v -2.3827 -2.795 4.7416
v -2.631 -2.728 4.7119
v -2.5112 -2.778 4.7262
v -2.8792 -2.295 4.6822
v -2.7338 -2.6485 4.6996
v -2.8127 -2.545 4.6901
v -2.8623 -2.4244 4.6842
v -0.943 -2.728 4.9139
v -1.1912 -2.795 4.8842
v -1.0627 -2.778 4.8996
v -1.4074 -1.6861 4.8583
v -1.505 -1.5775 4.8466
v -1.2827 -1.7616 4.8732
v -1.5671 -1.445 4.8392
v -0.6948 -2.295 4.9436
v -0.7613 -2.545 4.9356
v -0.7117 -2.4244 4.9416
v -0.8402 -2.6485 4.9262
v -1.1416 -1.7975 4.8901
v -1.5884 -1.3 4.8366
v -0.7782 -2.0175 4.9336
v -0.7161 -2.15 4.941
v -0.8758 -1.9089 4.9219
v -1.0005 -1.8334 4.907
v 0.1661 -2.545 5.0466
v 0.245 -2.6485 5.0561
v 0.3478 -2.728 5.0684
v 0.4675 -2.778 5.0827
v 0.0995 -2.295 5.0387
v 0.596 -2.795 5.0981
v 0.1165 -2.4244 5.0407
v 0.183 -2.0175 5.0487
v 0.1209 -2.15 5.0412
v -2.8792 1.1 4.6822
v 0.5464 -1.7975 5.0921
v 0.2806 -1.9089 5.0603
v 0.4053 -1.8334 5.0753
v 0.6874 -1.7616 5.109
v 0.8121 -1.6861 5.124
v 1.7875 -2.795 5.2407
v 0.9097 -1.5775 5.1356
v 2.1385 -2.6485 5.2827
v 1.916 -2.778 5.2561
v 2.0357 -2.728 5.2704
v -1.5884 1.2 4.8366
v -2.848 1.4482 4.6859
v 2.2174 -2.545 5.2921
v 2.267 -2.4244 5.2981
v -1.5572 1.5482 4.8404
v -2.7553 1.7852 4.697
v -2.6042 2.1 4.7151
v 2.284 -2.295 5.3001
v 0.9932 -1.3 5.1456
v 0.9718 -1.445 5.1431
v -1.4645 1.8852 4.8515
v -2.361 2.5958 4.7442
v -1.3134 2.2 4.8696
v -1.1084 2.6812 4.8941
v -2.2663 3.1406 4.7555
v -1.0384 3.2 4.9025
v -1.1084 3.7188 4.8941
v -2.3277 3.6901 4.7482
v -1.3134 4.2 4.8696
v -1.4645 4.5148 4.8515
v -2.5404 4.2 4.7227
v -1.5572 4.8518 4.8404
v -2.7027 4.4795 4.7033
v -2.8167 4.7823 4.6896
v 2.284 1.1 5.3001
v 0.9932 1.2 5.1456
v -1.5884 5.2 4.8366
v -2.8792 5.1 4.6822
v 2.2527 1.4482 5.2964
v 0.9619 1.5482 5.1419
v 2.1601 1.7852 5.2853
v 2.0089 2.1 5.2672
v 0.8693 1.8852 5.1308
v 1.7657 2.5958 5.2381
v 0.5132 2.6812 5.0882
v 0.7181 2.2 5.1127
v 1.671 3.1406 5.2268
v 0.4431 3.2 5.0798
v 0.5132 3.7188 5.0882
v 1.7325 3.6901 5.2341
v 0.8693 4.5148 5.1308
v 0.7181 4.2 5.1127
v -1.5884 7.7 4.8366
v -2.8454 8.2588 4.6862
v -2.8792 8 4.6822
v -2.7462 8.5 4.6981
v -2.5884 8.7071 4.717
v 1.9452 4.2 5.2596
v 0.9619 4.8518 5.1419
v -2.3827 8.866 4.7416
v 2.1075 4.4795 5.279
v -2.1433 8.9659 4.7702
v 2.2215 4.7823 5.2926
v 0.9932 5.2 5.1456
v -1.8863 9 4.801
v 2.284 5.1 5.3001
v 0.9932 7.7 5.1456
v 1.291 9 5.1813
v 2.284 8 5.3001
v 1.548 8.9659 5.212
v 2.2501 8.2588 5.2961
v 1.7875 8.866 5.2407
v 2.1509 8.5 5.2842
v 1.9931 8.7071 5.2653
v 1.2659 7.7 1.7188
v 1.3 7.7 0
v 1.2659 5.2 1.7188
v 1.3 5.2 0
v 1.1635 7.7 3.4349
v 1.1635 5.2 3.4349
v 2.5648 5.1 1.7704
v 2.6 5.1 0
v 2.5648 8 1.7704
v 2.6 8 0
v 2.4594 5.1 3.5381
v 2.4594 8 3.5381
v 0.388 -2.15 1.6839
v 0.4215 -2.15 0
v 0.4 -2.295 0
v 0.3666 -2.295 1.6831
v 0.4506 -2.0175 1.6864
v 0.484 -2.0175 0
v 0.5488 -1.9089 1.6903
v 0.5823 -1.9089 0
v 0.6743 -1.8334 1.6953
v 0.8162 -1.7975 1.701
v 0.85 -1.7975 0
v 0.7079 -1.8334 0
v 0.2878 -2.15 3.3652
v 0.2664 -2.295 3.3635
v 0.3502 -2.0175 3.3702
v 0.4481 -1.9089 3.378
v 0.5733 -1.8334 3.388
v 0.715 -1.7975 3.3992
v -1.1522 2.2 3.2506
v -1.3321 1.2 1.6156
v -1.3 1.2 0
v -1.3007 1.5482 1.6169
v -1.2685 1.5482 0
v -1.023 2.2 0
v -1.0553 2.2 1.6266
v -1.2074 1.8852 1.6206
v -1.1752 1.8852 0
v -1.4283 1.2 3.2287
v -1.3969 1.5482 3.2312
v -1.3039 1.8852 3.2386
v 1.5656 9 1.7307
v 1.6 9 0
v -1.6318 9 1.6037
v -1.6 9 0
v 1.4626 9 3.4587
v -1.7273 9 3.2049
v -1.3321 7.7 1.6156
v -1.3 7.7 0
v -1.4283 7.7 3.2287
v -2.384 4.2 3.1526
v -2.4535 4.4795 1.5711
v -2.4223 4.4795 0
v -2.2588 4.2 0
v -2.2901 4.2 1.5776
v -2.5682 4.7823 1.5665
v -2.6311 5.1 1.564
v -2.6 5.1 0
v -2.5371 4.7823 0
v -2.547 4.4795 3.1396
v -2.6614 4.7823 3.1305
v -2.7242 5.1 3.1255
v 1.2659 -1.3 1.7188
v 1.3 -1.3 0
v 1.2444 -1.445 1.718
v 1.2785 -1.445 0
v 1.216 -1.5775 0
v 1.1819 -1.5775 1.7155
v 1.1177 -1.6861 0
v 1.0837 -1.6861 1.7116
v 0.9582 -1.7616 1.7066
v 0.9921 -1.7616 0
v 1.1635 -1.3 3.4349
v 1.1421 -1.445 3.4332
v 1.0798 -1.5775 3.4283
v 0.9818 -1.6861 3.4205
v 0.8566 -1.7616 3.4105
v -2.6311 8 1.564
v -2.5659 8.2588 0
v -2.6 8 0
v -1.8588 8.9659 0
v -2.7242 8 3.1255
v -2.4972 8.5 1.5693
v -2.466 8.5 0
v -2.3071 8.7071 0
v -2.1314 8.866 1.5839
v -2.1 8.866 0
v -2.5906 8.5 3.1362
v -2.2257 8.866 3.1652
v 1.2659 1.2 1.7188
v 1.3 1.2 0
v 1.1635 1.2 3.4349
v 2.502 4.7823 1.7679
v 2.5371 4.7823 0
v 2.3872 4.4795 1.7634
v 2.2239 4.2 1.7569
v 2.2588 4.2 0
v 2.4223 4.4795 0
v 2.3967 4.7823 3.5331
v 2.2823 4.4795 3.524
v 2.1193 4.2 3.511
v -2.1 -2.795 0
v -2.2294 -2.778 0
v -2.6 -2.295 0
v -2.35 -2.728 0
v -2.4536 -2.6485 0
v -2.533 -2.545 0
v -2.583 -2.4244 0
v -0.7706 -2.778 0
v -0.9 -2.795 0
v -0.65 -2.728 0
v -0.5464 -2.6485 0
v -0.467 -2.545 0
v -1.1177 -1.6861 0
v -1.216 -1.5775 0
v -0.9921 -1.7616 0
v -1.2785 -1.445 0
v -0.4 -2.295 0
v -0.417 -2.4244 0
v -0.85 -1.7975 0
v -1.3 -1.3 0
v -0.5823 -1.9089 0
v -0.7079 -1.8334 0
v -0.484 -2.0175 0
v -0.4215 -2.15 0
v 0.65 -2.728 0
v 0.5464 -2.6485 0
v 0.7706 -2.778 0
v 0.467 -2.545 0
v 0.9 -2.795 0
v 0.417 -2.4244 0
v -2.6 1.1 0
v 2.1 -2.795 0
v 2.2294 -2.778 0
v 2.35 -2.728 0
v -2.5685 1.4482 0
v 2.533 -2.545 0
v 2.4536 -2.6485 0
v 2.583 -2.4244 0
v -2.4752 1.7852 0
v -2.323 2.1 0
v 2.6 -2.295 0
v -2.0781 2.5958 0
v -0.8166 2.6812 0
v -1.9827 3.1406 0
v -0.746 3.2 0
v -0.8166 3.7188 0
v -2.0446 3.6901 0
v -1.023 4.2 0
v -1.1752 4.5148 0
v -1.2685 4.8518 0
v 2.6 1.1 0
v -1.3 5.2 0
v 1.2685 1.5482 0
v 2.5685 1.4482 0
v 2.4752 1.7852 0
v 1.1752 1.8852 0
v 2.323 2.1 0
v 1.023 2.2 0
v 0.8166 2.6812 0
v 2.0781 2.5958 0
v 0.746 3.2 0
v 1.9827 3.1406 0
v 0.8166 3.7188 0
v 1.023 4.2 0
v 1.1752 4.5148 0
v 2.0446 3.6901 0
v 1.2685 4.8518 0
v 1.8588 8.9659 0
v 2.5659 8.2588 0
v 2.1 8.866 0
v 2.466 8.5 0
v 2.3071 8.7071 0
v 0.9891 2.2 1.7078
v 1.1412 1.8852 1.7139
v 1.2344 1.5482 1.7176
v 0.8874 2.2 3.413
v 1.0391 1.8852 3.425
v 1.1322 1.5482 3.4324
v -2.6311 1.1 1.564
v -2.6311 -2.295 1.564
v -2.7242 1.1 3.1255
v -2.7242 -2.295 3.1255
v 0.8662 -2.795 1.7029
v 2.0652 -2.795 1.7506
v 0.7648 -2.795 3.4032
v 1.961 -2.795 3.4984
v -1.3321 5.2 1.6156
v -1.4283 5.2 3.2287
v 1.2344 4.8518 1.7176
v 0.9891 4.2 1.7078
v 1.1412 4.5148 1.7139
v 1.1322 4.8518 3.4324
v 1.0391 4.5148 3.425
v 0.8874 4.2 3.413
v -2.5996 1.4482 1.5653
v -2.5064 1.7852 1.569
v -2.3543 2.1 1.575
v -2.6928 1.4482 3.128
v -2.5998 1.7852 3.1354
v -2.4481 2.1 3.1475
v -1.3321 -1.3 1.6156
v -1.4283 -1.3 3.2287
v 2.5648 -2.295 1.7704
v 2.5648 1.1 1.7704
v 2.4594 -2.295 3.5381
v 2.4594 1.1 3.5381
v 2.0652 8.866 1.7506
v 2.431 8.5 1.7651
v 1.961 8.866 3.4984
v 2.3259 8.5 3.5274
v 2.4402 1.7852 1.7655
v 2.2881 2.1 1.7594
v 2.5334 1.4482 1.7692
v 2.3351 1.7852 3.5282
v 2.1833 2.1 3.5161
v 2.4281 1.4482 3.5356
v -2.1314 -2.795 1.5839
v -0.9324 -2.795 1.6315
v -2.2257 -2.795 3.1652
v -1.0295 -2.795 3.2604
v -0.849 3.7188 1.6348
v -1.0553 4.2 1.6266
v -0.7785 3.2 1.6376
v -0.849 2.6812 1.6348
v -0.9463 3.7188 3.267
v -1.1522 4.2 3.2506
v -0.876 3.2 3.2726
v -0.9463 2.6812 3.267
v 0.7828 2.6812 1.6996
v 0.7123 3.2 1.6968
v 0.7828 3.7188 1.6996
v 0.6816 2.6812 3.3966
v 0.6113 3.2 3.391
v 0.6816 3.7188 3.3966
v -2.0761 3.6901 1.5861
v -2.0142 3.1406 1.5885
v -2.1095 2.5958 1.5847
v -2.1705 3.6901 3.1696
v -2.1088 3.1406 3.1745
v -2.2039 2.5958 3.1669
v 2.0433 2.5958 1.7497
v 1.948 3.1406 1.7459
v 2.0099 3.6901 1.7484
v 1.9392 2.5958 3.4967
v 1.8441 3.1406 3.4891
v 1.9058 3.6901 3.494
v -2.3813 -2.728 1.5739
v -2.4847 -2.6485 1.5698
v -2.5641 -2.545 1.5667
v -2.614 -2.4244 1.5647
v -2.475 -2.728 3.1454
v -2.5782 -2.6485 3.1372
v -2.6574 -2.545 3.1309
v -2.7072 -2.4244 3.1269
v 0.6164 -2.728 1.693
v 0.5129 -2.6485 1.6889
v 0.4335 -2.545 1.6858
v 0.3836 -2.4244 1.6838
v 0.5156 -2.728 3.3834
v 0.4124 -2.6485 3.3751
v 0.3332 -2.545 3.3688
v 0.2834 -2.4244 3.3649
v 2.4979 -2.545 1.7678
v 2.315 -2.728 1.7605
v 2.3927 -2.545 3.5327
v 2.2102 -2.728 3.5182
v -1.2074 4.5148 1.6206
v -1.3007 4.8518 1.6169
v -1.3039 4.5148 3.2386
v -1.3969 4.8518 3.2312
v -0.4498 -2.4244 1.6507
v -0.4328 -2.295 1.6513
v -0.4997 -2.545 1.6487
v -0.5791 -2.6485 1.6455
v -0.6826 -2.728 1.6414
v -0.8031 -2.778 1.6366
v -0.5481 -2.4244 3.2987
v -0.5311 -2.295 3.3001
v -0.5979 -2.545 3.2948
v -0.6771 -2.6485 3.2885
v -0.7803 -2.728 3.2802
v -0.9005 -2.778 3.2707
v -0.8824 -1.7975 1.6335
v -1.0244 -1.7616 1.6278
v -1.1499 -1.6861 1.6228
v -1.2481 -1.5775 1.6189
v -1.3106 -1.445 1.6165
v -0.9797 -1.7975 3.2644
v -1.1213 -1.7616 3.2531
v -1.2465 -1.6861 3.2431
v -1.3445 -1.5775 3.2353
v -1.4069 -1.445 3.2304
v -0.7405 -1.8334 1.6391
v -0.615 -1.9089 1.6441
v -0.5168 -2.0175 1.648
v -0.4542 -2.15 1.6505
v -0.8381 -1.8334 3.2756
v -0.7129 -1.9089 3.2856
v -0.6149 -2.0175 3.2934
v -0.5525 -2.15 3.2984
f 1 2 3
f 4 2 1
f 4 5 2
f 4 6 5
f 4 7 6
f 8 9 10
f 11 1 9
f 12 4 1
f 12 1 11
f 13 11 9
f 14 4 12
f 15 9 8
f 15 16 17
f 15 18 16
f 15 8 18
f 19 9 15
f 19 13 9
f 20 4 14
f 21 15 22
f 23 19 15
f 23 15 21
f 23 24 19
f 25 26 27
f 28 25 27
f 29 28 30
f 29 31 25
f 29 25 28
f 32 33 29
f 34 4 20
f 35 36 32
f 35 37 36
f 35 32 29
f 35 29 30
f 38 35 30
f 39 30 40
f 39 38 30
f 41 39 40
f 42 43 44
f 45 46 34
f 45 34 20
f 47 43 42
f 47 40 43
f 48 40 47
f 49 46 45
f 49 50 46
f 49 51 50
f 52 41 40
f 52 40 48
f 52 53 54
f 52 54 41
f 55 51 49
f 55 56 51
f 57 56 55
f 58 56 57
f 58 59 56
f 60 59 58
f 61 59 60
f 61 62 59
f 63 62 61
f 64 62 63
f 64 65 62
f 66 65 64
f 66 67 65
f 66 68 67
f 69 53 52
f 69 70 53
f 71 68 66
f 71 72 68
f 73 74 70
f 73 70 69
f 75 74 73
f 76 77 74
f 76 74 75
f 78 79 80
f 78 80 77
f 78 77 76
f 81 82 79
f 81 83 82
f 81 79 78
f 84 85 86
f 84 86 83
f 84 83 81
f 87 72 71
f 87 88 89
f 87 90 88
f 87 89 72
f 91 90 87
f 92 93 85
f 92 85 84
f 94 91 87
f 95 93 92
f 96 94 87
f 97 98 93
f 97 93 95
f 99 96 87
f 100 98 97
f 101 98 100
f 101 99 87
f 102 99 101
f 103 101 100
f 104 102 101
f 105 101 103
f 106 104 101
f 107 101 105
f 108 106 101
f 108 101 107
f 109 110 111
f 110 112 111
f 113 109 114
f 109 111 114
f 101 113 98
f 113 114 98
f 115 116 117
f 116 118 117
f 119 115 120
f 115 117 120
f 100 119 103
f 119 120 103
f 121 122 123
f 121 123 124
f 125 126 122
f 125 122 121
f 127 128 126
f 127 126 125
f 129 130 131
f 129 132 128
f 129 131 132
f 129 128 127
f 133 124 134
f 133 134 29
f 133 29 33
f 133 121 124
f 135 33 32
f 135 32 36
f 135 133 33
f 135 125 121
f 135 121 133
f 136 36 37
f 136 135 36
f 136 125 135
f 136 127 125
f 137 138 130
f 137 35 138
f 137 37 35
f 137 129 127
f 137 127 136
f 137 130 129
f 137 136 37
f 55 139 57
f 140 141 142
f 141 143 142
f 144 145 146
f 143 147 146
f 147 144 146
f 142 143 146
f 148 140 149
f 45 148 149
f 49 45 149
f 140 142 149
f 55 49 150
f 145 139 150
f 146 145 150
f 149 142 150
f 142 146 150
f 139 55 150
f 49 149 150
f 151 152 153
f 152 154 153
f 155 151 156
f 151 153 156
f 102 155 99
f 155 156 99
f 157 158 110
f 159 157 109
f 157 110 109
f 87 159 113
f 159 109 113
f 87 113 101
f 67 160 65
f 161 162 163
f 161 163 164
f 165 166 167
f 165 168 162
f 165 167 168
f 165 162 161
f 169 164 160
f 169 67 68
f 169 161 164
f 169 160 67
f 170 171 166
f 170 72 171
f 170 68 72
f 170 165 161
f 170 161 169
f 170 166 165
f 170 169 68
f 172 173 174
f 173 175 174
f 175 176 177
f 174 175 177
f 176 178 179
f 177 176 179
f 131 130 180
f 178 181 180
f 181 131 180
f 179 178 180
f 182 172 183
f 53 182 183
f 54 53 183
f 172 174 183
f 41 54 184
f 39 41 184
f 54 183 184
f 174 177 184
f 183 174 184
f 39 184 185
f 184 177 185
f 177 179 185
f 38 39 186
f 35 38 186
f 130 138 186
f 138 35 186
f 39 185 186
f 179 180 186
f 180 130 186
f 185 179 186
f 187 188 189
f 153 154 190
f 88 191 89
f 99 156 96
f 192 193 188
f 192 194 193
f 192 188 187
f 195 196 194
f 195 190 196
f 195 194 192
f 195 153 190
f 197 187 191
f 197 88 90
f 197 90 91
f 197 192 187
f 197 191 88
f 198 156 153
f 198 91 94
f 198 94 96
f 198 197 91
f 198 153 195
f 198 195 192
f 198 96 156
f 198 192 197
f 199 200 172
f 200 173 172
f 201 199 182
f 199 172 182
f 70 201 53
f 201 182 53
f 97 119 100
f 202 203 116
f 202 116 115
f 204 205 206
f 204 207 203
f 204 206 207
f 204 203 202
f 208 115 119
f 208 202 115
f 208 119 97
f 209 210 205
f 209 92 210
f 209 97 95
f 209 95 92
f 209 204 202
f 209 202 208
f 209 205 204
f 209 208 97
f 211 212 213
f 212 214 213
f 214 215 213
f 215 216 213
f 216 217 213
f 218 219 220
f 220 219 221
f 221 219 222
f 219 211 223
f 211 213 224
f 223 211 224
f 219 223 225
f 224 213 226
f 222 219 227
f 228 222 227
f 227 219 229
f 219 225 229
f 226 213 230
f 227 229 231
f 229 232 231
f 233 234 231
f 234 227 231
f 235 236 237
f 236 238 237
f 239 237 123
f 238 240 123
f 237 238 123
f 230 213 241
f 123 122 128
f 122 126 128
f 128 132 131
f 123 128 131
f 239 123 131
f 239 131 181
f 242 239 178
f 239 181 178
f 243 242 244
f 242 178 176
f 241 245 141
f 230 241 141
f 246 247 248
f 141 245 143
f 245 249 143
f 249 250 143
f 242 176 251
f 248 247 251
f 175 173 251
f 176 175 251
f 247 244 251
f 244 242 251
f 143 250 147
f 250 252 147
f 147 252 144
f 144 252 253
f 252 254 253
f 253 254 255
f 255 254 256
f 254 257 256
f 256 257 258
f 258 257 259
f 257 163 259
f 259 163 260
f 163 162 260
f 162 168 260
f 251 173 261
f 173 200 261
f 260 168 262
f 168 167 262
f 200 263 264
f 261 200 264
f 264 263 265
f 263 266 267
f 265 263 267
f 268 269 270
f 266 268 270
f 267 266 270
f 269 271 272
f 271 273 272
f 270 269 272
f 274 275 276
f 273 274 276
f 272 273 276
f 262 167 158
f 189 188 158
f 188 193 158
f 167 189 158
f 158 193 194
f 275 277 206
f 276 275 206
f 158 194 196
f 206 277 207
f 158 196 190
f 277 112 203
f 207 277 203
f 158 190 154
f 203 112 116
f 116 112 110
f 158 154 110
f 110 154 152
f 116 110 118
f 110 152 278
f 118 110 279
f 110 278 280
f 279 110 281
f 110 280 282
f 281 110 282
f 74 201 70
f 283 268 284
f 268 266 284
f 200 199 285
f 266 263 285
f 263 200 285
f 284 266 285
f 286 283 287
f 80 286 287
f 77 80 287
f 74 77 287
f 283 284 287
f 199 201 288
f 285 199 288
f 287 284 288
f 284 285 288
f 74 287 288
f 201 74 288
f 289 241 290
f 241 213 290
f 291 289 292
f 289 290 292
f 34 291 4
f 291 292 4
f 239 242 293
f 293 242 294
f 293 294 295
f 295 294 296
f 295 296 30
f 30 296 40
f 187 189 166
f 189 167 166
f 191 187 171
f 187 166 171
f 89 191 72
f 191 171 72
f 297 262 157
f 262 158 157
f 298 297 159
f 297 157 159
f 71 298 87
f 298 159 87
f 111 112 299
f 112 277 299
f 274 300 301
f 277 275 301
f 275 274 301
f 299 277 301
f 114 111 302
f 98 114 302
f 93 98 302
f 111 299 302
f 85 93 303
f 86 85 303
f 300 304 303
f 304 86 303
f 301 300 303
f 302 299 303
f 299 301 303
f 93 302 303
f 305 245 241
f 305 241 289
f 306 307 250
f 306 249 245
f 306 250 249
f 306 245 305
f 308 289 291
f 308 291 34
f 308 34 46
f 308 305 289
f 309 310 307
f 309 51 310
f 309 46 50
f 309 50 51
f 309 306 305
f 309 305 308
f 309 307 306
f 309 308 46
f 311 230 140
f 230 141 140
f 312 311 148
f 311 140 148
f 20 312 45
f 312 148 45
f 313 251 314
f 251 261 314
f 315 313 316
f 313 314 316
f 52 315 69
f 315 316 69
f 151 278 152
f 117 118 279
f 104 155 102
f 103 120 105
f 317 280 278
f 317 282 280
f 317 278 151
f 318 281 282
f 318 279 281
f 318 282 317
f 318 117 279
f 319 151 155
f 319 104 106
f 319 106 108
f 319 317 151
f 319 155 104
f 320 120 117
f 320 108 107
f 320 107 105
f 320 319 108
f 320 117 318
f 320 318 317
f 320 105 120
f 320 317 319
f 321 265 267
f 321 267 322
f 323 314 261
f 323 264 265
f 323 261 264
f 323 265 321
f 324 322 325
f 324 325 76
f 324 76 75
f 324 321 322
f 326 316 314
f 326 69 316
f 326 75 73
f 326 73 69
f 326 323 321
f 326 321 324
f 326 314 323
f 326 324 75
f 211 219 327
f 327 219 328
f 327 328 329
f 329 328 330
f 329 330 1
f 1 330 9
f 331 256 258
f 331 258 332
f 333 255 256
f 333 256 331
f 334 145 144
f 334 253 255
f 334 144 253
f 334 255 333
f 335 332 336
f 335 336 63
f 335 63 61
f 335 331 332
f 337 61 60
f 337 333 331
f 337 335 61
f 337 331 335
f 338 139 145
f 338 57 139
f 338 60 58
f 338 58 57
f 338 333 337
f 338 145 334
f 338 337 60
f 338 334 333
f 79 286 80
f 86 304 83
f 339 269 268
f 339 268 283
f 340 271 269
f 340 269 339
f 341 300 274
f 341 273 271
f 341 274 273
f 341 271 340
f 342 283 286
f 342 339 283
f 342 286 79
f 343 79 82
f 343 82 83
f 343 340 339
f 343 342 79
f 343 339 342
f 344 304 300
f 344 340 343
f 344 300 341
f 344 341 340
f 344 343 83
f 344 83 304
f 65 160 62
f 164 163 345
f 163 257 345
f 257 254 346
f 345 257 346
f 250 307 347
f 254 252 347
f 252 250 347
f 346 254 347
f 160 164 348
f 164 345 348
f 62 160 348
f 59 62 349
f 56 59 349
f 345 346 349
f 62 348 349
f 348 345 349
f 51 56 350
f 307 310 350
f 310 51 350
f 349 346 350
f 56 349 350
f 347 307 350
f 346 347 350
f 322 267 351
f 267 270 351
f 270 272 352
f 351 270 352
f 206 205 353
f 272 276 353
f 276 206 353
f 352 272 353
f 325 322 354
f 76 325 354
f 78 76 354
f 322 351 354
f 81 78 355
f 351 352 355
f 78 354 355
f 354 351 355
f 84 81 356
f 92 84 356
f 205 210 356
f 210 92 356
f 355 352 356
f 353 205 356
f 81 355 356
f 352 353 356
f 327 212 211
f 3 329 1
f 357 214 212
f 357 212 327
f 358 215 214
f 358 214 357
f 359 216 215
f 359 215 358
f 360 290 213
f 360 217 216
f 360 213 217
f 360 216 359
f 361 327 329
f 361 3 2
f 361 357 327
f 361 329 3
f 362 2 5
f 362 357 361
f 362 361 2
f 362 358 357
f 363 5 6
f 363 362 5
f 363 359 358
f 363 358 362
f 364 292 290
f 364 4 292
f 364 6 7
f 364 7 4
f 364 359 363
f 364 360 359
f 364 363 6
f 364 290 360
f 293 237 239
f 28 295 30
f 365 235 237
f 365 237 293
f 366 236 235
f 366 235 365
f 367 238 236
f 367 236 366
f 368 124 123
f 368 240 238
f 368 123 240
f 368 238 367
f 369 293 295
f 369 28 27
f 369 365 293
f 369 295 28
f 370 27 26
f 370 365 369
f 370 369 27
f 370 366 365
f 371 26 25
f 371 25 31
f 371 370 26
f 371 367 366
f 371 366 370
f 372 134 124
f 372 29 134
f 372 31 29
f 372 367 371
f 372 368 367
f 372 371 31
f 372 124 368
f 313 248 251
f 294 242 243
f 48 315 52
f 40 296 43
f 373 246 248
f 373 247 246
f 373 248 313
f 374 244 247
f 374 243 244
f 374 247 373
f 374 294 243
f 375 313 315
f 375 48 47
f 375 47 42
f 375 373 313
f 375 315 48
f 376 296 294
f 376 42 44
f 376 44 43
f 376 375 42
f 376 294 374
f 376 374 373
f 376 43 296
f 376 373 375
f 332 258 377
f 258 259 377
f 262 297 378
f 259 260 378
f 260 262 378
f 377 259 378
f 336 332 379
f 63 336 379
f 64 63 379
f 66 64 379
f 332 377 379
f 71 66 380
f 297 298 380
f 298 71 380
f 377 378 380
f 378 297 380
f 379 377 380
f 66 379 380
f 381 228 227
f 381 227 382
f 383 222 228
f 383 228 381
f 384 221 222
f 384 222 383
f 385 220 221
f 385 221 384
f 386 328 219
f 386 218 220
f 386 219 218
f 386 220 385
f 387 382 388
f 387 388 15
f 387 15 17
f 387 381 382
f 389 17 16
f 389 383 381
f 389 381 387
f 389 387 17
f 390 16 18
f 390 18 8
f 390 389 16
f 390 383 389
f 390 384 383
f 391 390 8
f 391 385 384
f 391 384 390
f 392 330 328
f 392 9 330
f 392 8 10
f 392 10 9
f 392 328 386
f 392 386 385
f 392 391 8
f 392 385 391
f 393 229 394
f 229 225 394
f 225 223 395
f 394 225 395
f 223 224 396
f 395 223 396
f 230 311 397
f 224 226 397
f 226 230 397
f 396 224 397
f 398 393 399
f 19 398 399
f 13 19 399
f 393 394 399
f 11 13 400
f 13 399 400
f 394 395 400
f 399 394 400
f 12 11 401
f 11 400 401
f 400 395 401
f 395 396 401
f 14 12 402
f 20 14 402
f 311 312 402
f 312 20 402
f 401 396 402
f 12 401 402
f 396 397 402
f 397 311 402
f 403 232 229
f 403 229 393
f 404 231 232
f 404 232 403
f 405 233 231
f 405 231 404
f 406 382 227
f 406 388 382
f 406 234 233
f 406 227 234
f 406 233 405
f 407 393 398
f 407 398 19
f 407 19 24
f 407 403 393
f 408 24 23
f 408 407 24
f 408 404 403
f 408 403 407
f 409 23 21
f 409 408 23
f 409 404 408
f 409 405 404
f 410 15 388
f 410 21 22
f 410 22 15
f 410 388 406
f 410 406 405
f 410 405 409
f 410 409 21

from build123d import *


with BuildPart() as part:
    # Sweep2: sweep along a path in Sketch12
    with BuildLine(Plane(origin=(0, 0, 0), x_dir=(1, 0, 0), z_dir=(0, 1, 0))) as sweep2_path:
        ThreePointArc((0, 0), (-0.074470784, -2.5), (-0.297619048, -4.99113443))
    # Sketch2 → Sweep2 (sweep)
    with BuildSketch(Plane.XY):
        with BuildLine():
            Line((-1.3, 7.7), (1.3, 7.7))
            Line((1.3, 7.7), (1.3, 5.2))
            ThreePointArc((1.3, 5.2), (1.229474497, 4.681174375), (1.023016035, 4.2))
            ThreePointArc((1.023016035, 4.2), (0.74603207, 3.2), (1.023016035, 2.2))
            ThreePointArc((1.023016035, 2.2), (1.229474497, 1.718825625), (1.3, 1.2))
            Line((1.3, 1.2), (1.3, -1.3))
            ThreePointArc((1.3, -1.3), (1.170809924, -1.635410197), (0.85, -1.797493719))
            ThreePointArc((0.85, -1.797493719), (0.529190076, -1.95957724), (0.4, -2.294987437))
            ThreePointArc((0.4, -2.294987437), (0.546446609, -2.648540828), (0.9, -2.794987437))
            Line((0.9, -2.794987437), (2.1, -2.794987437))
            ThreePointArc((2.1, -2.794987437), (2.453553391, -2.648540828), (2.6, -2.294987437))
            Line((2.6, -2.294987437), (2.6, 1.1))
            ThreePointArc((2.6, 1.1), (2.529474497, 1.618825625), (2.323016035, 2.1))
            ThreePointArc((2.323016035, 2.1), (1.982702832, 3.140572492), (2.258778081, 4.2))
            ThreePointArc((2.258778081, 4.2), (2.485981176, 4.628543914), (2.6, 5.1))
            Line((2.6, 5.1), (2.6, 8))
            ThreePointArc((2.6, 8), (2.307106781, 8.707106781), (1.6, 9))
            Line((1.6, 9), (-1.6, 9))
            ThreePointArc((-1.6, 9), (-2.307106781, 8.707106781), (-2.6, 8))
            Line((-2.6, 8), (-2.6, 5.1))
            ThreePointArc((-2.6, 5.1), (-2.485981176, 4.628543914), (-2.258778081, 4.2))
            ThreePointArc((-2.258778081, 4.2), (-1.982702832, 3.140572492), (-2.323016035, 2.1))
            ThreePointArc((-2.323016035, 2.1), (-2.529474497, 1.618825625), (-2.6, 1.1))
            Line((-2.6, 1.1), (-2.6, -2.294987437))
            ThreePointArc((-2.6, -2.294987437), (-2.453553391, -2.648540828), (-2.1, -2.794987437))
            Line((-2.1, -2.794987437), (-0.9, -2.794987437))
            ThreePointArc((-0.9, -2.794987437), (-0.546446609, -2.648540828), (-0.4, -2.294987437))
            ThreePointArc((-0.4, -2.294987437), (-0.529190076, -1.95957724), (-0.85, -1.797493719))
            ThreePointArc((-0.85, -1.797493719), (-1.170809924, -1.635410197), (-1.3, -1.3))
            Line((-1.3, -1.3), (-1.3, 1.2))
            ThreePointArc((-1.3, 1.2), (-1.229474497, 1.718825625), (-1.023016035, 2.2))
            ThreePointArc((-1.023016035, 2.2), (-0.74603207, 3.2), (-1.023016035, 4.2))
            ThreePointArc((-1.023016035, 4.2), (-1.229474497, 4.681174375), (-1.3, 5.2))
            Line((-1.3, 5.2), (-1.3, 7.7))
        make_face()
    sweep(path=sweep2_path.line)


solid = part.part
